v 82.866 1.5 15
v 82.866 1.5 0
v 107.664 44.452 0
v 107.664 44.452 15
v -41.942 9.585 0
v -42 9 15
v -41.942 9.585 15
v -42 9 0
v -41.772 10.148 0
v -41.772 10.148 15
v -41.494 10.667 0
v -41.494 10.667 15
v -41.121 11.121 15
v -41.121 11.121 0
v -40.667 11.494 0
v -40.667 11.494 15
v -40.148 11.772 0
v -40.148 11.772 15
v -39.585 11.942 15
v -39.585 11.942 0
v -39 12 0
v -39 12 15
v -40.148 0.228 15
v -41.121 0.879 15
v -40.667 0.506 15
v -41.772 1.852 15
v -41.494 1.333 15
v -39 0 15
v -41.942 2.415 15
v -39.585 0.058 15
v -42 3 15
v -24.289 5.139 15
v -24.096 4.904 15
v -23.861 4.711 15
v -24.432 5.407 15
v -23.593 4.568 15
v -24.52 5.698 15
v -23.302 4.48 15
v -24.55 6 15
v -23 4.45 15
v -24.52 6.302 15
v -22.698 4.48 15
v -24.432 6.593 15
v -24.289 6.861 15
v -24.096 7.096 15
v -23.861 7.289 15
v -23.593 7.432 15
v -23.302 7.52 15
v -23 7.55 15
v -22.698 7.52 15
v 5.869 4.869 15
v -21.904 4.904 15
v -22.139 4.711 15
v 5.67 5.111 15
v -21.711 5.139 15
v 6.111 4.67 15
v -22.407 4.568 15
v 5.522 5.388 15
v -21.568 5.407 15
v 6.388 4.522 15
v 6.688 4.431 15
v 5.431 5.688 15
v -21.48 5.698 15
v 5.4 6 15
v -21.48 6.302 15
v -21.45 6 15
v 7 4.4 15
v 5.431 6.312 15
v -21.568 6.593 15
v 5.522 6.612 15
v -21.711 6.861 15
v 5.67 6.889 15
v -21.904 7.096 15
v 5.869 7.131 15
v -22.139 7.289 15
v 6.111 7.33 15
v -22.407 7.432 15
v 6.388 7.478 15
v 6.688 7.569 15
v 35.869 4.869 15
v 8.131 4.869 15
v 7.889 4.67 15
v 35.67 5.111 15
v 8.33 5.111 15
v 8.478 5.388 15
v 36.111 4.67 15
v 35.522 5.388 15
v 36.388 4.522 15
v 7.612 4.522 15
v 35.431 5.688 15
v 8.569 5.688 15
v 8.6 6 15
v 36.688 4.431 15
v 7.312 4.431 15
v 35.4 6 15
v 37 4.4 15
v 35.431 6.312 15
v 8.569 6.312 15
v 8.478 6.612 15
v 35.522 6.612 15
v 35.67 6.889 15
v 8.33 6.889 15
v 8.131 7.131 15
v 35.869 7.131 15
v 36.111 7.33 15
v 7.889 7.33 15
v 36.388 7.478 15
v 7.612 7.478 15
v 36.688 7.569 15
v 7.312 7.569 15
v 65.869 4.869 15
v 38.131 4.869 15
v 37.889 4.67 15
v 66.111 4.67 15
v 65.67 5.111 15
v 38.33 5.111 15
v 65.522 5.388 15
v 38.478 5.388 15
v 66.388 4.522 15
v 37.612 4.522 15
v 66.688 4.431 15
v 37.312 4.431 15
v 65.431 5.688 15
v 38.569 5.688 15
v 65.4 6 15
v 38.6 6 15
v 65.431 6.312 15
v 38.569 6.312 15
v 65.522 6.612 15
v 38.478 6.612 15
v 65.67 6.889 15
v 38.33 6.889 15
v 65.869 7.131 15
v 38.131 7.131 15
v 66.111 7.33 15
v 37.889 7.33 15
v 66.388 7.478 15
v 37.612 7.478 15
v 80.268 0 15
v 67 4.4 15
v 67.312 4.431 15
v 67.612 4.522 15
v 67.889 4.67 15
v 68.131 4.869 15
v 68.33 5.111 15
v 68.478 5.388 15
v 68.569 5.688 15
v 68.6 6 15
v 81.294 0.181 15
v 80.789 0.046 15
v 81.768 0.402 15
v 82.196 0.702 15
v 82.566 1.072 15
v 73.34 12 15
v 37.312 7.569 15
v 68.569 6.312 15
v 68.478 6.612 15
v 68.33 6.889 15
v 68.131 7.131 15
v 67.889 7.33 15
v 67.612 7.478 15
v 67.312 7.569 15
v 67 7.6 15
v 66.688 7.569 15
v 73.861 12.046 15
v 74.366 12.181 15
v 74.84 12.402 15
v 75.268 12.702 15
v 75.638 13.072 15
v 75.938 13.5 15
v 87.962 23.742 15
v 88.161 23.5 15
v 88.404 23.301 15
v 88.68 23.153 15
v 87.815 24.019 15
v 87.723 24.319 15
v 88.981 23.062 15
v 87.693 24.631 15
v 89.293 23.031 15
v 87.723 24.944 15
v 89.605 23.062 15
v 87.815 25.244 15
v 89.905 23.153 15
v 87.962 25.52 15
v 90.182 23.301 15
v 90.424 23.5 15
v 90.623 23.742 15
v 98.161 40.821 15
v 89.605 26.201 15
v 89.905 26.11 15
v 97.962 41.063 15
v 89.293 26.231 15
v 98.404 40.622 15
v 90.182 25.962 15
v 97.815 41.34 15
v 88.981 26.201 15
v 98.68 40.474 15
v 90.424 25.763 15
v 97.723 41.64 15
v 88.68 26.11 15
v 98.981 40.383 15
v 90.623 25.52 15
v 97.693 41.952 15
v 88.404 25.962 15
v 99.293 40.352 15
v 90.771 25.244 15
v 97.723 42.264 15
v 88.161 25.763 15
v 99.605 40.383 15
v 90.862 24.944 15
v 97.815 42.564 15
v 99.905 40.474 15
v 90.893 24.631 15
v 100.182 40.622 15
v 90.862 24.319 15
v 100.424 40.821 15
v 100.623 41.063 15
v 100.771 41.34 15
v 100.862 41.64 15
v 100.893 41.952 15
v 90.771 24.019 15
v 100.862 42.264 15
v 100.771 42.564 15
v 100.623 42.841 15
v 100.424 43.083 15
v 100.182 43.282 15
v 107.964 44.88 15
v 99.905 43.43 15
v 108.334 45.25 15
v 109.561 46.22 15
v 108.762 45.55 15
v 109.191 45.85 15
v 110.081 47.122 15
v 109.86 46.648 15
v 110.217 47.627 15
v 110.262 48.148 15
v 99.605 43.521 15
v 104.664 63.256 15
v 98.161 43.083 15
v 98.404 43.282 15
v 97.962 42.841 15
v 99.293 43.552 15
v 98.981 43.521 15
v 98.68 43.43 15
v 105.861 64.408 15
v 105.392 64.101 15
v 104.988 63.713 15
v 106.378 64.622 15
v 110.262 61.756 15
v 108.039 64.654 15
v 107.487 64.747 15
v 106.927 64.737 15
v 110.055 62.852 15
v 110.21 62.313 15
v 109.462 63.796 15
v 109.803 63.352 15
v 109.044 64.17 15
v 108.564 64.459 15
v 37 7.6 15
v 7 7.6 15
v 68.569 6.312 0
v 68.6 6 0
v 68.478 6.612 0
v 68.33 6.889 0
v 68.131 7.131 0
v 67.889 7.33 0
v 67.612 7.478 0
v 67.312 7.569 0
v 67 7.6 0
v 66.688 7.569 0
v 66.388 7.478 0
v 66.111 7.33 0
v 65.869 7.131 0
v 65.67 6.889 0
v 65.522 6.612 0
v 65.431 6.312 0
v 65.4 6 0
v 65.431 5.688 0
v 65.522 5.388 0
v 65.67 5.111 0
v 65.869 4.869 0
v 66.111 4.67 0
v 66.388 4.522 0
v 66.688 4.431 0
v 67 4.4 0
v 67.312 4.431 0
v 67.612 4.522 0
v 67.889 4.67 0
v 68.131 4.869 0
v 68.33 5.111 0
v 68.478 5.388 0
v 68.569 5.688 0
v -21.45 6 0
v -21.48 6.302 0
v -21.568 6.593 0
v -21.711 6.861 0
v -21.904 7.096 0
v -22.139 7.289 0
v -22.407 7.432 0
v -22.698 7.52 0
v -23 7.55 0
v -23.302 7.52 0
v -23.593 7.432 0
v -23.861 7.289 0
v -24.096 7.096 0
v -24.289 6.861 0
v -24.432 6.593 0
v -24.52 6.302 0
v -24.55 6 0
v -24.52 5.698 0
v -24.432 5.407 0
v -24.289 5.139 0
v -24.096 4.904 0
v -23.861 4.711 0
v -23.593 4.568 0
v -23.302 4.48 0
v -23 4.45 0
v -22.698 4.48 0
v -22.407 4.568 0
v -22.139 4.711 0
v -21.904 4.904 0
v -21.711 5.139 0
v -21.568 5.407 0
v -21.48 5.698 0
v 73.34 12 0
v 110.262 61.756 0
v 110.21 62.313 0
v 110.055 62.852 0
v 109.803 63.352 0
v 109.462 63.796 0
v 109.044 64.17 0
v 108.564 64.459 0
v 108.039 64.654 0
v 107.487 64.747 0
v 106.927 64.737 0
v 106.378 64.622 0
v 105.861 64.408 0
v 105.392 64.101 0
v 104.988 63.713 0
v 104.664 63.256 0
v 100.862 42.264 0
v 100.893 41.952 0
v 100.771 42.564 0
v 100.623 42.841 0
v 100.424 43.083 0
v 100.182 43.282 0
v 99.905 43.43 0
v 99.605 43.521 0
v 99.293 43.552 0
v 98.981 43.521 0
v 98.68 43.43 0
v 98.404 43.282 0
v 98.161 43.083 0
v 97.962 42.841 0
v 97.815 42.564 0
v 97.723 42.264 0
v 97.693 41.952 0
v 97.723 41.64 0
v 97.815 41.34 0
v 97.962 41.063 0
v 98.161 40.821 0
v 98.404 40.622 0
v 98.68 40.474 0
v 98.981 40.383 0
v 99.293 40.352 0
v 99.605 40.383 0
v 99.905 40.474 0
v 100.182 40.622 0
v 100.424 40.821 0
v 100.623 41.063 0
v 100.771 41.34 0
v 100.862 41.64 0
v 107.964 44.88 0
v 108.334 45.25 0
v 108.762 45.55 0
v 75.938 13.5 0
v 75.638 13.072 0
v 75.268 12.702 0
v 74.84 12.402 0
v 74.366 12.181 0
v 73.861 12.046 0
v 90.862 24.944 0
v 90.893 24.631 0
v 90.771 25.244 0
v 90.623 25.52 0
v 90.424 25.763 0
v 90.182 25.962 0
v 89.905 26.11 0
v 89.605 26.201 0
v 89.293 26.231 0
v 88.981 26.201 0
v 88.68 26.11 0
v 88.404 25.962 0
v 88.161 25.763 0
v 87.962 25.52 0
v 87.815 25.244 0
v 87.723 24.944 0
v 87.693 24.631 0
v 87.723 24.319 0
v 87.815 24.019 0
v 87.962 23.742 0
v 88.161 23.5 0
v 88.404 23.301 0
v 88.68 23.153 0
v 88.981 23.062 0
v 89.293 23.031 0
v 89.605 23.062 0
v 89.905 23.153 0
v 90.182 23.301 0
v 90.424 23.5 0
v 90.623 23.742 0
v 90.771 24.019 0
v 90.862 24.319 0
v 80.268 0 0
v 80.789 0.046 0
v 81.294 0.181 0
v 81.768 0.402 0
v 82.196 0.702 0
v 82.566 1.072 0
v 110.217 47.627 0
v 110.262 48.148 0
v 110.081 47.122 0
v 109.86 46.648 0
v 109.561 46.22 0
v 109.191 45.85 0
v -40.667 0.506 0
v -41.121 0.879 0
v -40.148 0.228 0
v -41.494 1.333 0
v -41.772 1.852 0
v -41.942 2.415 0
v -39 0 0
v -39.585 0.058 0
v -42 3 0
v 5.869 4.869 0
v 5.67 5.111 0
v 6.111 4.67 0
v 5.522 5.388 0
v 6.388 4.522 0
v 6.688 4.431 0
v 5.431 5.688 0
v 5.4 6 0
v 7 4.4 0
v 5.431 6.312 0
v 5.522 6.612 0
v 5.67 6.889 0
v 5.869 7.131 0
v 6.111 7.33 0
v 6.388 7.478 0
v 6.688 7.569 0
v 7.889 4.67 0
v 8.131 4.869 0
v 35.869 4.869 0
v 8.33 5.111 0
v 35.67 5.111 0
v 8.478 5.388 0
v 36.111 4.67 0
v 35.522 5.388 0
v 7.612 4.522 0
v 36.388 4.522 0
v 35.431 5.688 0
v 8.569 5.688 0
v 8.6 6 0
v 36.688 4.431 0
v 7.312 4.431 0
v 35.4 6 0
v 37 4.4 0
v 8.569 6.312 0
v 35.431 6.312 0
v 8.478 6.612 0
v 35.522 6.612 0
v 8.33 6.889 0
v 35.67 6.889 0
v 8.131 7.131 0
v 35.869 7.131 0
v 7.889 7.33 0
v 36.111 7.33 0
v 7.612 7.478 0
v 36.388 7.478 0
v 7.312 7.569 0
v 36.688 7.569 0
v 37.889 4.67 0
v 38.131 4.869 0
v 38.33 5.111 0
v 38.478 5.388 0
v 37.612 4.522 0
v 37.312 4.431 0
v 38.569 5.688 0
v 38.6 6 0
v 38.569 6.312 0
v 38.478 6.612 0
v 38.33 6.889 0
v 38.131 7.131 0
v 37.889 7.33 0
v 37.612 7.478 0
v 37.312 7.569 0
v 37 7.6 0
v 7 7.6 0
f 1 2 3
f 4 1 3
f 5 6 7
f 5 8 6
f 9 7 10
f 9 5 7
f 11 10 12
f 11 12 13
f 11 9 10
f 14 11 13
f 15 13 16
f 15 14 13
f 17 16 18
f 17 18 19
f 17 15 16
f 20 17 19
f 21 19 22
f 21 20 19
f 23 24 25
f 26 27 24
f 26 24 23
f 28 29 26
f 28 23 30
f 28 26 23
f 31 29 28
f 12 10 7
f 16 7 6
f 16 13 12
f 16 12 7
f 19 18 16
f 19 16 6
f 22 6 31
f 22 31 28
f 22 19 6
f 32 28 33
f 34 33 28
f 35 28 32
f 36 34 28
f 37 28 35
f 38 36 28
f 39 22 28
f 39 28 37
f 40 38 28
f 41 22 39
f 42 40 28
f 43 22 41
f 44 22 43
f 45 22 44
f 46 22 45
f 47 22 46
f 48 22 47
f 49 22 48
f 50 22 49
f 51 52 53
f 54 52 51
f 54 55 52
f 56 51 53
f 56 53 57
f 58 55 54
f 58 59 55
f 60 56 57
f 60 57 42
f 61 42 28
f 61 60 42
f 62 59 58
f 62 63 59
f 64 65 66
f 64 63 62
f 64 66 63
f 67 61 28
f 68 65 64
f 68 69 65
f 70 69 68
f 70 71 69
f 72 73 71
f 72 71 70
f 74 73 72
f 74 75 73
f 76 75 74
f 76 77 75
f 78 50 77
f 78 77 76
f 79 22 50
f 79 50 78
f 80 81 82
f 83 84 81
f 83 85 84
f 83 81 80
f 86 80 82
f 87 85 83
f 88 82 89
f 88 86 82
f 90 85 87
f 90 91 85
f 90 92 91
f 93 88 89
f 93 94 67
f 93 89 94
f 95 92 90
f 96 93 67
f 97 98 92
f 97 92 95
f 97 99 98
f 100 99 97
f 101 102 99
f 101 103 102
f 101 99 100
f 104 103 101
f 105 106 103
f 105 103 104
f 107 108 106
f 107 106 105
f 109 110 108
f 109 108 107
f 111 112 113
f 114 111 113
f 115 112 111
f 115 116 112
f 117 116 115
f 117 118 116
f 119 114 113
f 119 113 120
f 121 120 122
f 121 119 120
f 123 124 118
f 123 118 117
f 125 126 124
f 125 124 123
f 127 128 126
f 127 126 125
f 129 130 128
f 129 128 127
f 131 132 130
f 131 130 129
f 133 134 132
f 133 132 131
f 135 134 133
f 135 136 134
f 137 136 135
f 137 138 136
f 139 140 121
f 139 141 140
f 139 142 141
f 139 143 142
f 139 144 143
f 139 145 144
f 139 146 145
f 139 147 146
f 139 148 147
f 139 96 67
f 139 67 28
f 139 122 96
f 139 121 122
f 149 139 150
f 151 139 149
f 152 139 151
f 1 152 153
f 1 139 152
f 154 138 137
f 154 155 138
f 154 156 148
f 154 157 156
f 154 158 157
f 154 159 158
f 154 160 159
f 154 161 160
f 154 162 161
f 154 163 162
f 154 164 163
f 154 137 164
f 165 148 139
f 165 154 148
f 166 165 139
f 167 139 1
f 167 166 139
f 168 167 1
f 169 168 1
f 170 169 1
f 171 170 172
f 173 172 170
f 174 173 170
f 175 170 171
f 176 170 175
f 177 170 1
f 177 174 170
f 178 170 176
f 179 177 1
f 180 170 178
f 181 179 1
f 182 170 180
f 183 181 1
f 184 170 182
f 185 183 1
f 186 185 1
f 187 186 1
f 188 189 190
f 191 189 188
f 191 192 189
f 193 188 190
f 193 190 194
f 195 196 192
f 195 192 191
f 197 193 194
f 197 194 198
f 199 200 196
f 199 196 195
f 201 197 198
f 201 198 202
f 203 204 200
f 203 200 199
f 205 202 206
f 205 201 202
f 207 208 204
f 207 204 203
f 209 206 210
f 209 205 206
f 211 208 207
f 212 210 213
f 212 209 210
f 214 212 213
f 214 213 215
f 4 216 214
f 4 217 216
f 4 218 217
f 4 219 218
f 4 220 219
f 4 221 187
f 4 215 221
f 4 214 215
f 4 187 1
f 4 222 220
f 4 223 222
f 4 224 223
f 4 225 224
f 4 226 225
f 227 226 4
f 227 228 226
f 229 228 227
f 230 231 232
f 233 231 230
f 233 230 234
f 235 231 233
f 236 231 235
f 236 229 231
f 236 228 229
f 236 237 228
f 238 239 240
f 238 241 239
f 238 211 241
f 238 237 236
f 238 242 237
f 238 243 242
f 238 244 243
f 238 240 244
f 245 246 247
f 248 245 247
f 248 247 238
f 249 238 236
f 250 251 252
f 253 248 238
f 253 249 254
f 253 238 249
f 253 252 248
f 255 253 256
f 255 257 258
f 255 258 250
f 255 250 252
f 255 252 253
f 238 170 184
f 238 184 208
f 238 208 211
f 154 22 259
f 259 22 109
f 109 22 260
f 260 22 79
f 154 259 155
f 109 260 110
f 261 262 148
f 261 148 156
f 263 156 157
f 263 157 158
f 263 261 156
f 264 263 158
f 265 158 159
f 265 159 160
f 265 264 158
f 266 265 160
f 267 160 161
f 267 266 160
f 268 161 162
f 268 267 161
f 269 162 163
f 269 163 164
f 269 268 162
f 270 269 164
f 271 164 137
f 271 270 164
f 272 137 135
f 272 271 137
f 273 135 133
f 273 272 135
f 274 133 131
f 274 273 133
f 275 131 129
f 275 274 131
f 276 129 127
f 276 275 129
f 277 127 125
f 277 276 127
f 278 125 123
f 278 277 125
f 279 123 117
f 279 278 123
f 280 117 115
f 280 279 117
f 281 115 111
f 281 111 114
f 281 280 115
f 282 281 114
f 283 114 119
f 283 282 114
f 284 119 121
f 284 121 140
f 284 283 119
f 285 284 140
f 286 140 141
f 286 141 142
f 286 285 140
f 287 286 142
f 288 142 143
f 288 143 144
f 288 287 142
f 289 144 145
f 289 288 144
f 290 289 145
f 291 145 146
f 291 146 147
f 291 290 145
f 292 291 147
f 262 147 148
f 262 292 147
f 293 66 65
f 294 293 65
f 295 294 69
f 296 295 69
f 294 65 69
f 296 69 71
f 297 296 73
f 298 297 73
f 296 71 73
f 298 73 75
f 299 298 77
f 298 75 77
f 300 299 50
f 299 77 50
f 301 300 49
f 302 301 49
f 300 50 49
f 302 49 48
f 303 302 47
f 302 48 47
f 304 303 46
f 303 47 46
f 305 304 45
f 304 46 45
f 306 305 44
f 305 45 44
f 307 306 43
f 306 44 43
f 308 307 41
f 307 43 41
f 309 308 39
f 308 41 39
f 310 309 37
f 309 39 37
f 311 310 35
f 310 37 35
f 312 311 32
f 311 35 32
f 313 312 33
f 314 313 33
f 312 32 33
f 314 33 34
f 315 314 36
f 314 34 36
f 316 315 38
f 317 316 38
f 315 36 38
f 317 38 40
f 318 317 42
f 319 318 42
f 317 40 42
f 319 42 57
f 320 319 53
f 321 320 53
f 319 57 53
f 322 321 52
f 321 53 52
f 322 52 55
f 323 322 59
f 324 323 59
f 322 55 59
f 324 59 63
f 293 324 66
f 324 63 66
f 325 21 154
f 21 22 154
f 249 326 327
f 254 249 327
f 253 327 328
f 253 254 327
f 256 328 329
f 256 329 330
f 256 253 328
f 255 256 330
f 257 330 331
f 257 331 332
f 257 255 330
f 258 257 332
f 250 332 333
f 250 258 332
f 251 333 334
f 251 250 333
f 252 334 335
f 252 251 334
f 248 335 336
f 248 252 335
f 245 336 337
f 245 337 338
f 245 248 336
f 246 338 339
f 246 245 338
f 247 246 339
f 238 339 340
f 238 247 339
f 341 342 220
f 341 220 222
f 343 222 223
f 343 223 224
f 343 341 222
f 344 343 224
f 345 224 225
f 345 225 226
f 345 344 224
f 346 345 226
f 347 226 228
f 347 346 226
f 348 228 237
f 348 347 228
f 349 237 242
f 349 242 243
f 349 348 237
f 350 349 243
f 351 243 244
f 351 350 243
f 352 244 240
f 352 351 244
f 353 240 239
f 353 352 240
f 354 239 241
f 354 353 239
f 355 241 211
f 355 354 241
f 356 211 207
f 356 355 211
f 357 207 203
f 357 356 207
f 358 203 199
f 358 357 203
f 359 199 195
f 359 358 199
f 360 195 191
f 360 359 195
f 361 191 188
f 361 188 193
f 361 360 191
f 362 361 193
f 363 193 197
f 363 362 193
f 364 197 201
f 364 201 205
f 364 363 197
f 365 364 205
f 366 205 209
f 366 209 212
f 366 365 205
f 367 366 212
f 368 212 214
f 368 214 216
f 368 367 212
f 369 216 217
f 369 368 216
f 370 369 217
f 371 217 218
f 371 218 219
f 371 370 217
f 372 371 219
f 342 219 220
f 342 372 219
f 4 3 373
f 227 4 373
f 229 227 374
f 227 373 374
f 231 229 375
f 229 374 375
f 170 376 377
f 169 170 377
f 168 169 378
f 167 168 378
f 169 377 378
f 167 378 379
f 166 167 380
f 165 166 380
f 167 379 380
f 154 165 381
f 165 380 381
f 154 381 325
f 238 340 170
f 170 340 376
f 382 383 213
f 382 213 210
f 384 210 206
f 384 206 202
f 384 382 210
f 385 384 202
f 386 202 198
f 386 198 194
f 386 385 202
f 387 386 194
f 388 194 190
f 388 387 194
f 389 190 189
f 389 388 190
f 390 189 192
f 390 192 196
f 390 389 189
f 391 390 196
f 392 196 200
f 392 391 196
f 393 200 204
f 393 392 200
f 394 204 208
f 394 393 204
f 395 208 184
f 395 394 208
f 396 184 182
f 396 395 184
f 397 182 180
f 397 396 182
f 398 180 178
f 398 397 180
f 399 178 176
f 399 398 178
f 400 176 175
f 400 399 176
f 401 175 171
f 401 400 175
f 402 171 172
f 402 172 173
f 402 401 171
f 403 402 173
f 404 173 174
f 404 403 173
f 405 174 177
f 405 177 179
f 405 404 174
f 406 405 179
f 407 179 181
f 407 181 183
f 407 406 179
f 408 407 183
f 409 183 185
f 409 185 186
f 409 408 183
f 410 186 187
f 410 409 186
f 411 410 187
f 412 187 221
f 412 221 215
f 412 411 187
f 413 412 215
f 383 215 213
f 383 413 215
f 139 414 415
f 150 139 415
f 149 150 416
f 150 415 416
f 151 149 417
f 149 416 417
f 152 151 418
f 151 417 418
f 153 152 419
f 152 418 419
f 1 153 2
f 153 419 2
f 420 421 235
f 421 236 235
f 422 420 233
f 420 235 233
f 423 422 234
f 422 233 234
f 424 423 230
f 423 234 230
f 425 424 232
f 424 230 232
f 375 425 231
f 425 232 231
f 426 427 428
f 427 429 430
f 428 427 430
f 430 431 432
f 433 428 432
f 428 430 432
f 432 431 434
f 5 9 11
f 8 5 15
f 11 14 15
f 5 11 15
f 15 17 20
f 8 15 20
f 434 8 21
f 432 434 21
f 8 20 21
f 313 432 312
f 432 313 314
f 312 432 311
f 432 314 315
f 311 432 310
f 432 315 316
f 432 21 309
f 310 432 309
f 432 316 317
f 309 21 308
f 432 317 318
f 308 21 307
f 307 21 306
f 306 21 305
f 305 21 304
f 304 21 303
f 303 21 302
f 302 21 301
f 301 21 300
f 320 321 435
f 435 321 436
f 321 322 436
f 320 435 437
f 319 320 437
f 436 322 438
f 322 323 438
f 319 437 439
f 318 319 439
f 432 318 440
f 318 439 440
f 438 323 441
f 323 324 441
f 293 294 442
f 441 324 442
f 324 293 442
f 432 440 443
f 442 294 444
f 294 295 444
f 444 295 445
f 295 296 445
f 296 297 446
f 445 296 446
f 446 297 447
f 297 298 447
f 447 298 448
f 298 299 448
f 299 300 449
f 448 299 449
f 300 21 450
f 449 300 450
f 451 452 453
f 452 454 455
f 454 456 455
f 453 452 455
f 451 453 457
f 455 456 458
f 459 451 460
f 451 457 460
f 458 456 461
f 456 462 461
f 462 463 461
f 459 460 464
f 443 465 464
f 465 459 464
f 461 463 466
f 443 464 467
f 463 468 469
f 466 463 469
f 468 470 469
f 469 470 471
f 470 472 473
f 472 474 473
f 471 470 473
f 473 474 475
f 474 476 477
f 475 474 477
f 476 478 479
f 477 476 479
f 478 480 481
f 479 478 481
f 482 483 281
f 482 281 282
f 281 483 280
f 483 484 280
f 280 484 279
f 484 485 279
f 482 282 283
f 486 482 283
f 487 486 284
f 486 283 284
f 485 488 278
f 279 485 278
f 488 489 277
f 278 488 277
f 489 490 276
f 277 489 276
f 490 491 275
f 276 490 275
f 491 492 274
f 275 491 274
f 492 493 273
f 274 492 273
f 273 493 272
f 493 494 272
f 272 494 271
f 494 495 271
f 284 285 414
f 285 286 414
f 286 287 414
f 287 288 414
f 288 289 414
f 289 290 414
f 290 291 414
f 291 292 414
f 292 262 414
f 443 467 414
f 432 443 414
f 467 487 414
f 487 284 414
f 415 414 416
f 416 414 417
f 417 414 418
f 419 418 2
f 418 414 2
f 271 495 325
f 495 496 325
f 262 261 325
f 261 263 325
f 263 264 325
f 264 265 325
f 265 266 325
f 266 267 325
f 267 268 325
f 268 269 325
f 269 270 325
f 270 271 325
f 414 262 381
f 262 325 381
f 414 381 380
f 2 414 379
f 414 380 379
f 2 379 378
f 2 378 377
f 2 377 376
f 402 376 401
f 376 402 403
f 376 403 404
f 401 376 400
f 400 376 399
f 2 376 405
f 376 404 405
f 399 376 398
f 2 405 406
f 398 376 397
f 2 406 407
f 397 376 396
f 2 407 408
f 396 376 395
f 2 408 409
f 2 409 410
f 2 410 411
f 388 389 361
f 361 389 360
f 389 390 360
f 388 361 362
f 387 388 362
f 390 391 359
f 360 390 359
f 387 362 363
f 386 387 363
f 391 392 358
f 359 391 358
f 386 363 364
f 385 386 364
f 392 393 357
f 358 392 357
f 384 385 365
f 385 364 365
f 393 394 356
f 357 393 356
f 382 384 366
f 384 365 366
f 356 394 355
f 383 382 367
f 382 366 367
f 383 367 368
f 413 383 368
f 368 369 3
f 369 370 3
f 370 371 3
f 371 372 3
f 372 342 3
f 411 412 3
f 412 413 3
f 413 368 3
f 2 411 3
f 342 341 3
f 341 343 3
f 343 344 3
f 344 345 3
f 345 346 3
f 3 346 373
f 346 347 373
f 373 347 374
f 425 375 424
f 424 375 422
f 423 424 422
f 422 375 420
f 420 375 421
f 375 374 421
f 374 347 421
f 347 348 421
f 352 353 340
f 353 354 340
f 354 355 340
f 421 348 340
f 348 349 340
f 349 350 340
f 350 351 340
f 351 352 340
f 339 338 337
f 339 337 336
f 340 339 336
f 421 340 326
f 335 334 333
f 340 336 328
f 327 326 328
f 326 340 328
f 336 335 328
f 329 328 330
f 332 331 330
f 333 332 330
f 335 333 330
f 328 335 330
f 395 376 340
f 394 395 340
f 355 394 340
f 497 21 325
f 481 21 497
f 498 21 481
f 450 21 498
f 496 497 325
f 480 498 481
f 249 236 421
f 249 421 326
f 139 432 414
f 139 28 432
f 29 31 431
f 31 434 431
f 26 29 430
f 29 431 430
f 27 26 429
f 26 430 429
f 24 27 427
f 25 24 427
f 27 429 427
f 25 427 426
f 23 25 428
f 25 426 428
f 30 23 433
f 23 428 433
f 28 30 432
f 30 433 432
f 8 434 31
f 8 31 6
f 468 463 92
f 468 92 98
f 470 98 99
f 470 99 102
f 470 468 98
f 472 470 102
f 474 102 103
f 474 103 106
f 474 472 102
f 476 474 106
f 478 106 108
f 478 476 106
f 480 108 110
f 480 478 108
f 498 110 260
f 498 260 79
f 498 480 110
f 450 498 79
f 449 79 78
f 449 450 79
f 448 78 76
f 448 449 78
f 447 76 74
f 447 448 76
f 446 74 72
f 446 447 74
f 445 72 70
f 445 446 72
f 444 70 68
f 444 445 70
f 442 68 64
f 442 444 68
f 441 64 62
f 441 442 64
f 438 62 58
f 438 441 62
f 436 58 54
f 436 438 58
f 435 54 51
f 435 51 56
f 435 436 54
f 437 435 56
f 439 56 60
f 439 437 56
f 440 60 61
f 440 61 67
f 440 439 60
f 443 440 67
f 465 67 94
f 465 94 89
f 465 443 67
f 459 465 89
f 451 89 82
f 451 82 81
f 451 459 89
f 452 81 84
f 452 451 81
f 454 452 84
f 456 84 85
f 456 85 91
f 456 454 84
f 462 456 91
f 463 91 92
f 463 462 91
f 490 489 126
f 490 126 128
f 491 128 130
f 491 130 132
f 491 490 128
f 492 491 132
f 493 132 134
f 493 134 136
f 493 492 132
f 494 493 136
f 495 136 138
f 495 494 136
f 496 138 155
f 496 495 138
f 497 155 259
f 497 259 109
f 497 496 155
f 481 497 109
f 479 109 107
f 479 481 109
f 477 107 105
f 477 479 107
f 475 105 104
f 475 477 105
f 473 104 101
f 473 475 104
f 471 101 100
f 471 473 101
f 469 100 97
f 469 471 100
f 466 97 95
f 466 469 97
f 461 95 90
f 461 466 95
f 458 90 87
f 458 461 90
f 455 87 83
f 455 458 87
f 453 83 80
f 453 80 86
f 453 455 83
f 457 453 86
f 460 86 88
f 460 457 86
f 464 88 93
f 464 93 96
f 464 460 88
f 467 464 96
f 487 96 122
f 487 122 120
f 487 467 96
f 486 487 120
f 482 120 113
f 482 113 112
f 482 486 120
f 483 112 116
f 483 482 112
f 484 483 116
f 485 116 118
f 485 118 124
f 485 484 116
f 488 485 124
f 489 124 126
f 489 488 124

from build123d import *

# Parameters (mm, degrees)
SKETCH_2_R      = 1.6
EXTRUDE_1_DEPTH = 15
FILLET_1_R      = 3
SKETCH_3_W      = 45
SKETCH_3_H      = 12
SKETCH_3_R      = 1.55
EXTRUDE_2_DEPTH = 15
FILLET_2_R      = 3


with BuildPart() as part:
    # 草图2 → 凸台-拉伸1 (new body)
    with BuildSketch(Plane.XY):
        with BuildLine():
            Line((110.262395693, 45.951905284), (110.262395693, 72.951905284))
            Line((110.262395693, 72.951905284), (75.937822174, 13.5))
            ThreePointArc((75.937822174, 13.5), (74.839745962, 12.401923789), (73.339745962, 12))
            Line((73.339745962, 12), (0, 12))
            Line((0, 12), (0, 0))
            Line((0, 0), (80.267949192, 0))
            ThreePointArc((80.267949192, 0), (81.767949192, 0.401923789), (82.866025404, 1.5))
            Line((82.866025404, 1.5), (107.664319482, 44.451905284))
            ThreePointArc((107.664319482, 44.451905284), (108.762395693, 45.549981495), (110.262395693, 45.951905284))
        make_face()
        with Locations((99.292740578, 41.951905284)):
            Circle(SKETCH_2_R, mode=Mode.SUBTRACT)
        with Locations((89.292740578, 24.631397208)):
            Circle(SKETCH_2_R, mode=Mode.SUBTRACT)
        with Locations((67, 6)):
            Circle(SKETCH_2_R, mode=Mode.SUBTRACT)
        with Locations((37, 6)):
            Circle(SKETCH_2_R, mode=Mode.SUBTRACT)
        with Locations((7, 6)):
            Circle(SKETCH_2_R, mode=Mode.SUBTRACT)
    extrude(amount=EXTRUDE_1_DEPTH)

    # 圆角1
    fillet_1_edges = [part.edges().sort_by_distance(p)[0] for p in [
        (0, 0, 7.5),
        (0, 12, 7.5),
        (110.262395693, 72.951905284, 7.5),
        (110.262395693, 45.951905284, 7.5),
    ]]
    fillet(fillet_1_edges, radius=FILLET_1_R)

    # 草图3 → 凸台-拉伸2 (add)
    with BuildSketch(Plane.XY.offset(15)):
        with Locations((-19.5, 6)):
            Rectangle(SKETCH_3_W, SKETCH_3_H)
        with Locations((-23, 6)):
            Circle(SKETCH_3_R, mode=Mode.SUBTRACT)
    extrude(amount=-EXTRUDE_2_DEPTH)

    # 圆角2
    fillet_2_edges = [part.edges().sort_by_distance(p)[0] for p in [
        (-42, 0, 7.5),
        (-42, 12, 7.5),
    ]]
    fillet(fillet_2_edges, radius=FILLET_2_R)


solid = part.part
